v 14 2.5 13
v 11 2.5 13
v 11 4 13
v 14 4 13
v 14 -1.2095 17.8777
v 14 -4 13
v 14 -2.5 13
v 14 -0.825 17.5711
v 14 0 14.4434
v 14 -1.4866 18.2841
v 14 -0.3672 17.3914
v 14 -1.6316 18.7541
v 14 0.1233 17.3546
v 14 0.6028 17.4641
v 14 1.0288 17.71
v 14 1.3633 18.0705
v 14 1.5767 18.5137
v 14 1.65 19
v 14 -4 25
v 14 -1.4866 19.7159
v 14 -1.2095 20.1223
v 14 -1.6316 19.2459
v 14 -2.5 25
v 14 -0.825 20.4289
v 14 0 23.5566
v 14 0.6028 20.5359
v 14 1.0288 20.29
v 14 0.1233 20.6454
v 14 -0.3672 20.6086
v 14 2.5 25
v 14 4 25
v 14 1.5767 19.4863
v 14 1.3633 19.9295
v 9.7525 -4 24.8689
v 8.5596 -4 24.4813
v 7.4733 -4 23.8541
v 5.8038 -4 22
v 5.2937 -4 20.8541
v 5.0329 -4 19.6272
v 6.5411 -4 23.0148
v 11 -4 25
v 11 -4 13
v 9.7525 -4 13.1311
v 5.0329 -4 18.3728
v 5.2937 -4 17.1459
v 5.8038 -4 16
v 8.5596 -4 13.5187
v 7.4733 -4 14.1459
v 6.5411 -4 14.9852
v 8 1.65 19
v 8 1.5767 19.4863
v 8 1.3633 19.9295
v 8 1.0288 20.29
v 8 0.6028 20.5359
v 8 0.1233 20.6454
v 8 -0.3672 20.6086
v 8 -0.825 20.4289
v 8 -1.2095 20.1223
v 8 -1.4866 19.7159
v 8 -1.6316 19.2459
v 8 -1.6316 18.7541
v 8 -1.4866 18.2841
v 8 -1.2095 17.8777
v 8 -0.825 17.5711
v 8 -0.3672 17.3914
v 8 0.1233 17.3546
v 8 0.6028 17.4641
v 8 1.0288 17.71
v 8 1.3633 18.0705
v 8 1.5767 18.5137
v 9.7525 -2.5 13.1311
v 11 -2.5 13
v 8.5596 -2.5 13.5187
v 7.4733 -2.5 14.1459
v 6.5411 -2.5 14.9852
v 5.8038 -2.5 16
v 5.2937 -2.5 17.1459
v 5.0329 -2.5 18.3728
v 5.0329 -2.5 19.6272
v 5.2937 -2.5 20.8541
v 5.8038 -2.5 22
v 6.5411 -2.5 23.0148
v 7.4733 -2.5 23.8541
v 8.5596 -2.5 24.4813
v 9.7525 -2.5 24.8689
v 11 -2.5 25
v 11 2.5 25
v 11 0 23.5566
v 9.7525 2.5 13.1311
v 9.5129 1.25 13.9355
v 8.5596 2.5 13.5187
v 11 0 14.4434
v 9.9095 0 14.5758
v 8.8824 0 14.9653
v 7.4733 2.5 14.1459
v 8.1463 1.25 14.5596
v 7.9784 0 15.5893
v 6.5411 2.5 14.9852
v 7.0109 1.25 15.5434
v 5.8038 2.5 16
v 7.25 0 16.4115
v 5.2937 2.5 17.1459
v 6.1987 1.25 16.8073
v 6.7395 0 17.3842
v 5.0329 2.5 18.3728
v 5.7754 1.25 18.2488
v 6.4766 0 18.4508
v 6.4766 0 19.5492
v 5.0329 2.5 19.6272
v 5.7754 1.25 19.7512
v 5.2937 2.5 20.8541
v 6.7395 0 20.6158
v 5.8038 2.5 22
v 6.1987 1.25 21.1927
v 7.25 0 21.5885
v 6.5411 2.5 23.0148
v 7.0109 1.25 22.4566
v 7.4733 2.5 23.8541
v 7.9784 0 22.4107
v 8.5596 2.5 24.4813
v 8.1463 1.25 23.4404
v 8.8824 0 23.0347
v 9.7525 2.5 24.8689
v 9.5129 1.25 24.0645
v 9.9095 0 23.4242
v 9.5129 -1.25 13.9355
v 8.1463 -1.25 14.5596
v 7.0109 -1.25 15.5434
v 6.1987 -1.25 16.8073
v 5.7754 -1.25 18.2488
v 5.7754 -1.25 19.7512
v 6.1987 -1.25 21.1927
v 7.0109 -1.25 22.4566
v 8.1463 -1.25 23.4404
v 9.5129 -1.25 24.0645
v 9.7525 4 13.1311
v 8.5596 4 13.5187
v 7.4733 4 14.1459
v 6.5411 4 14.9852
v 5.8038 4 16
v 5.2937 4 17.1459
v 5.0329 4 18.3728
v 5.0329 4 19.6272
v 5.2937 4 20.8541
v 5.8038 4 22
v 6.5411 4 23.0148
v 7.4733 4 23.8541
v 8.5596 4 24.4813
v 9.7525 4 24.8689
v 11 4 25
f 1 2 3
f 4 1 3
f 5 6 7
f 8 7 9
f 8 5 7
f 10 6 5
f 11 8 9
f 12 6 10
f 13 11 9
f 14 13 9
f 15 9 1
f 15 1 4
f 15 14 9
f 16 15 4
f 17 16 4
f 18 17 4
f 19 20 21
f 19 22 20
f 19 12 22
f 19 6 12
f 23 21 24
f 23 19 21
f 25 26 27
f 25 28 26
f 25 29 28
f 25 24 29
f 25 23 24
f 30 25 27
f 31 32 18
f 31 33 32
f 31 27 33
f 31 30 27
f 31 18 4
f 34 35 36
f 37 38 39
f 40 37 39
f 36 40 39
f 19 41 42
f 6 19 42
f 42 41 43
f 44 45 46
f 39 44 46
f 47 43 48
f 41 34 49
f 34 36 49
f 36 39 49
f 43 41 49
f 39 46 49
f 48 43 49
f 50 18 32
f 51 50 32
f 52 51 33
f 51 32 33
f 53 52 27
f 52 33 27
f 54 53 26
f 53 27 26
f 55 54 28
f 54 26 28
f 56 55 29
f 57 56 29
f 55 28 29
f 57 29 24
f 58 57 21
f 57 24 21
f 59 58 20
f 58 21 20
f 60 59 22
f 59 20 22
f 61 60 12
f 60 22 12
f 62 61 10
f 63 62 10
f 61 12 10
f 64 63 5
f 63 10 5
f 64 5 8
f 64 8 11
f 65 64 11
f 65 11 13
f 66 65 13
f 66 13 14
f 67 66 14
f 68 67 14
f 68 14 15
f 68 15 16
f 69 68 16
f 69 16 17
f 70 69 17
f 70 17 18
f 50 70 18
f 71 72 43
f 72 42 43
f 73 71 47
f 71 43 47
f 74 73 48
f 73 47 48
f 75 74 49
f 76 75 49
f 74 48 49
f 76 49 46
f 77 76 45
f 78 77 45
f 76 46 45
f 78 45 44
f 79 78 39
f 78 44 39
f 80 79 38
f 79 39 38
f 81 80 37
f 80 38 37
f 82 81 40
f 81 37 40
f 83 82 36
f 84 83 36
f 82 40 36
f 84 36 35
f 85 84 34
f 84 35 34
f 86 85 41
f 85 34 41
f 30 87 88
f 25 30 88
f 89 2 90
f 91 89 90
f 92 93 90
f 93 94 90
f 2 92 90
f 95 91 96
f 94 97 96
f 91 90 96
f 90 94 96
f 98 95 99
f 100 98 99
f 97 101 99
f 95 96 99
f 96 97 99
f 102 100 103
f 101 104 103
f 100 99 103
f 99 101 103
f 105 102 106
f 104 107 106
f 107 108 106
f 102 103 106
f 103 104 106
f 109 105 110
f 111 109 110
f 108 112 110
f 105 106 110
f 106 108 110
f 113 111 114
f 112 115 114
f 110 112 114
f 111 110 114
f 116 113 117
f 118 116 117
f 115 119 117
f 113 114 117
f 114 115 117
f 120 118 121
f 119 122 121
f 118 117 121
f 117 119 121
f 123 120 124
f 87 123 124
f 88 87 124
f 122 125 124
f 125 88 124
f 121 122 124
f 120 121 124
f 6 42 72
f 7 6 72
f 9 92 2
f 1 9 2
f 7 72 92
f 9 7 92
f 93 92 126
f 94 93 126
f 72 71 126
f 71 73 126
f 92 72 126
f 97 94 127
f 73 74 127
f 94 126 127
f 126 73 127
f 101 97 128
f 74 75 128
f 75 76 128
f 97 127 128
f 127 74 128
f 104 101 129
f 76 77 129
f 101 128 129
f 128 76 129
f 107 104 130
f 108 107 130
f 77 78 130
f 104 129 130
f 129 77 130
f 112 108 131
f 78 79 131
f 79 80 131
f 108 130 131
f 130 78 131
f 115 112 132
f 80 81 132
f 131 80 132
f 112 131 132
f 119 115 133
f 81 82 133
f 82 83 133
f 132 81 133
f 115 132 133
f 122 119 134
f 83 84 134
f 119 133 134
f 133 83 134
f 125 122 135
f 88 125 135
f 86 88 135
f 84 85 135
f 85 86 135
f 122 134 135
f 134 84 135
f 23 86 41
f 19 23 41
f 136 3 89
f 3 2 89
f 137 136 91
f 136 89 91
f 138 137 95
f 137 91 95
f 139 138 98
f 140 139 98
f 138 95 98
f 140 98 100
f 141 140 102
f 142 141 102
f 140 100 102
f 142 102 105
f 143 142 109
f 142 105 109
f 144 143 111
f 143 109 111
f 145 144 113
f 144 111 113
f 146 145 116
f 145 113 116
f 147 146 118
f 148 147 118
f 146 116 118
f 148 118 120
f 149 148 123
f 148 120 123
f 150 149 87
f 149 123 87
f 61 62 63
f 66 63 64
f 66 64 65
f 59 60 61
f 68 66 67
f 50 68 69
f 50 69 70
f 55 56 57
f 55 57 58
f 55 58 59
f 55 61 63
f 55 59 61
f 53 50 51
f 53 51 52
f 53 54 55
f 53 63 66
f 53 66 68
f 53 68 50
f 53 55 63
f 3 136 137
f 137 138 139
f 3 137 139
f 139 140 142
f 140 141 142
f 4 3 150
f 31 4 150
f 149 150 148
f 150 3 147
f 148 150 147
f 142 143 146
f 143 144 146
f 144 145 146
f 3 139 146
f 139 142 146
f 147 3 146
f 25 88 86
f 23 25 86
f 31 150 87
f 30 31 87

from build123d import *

# Parameters (mm, degrees)
REVOLUTION002_ANGLE     = 180
SKETCH015_R             = 1.65
POCKET007_DEPTH         = 7
PAD006_DEPTH            = 3
SKETCH022_R             = 1.65
POCKET012_DEPTH         = 6
BODY004_PLACEMENT_ANGLE = 180


with BuildPart() as part:
    # Sketch014 → Revolution002 (revolve)
    with BuildSketch(Plane.YZ):
        Polygon((-4, 0), (4, 0), (4, 6), (2.5, 6), (0, 4.556624), (-2.5, 6), (-4, 6), align=None)
    revolve(axis=Axis((0, 0, 0), (0, 1, 0)), revolution_arc=REVOLUTION002_ANGLE)

    # Sketch015 → Pocket007 (cut)
    with BuildSketch(Plane(origin=(-5, 0, 0), x_dir=(0, 1, 0), z_dir=(-1, 0, 0))):
        Circle(SKETCH015_R)
    extrude(amount=-POCKET007_DEPTH, mode=Mode.SUBTRACT)

    # Revolution002 Face7 → Pad006 (add)
    with BuildSketch(Plane(origin=(0, 0, 0), x_dir=(0, 1, 0), z_dir=(-1, 0, 0))):
        Polygon((4, -6), (4, 6), (2.5, 6), (0, 4.556624), (-2.5, 6), (-4, 6), (-4, -6), (-2.5, -6), (0, -4.556624), (2.5, -6), align=None)
    extrude(amount=PAD006_DEPTH)

    # Sketch022 (on Face5 of Pad006) → Pocket012 (cut)
    with BuildSketch(Plane(origin=(-3, 0, 0), x_dir=(0, 1, 0), z_dir=(-1, 0, 0))):
        Circle(SKETCH022_R)
    extrude(amount=-POCKET012_DEPTH, mode=Mode.SUBTRACT)


with BuildPart() as part_1:
    # Body004 placement: moved
    add(part.part.moved(Location((11, 0, 19))).rotate(Axis((11, 0, 19), (0, 1, 0)), BODY004_PLACEMENT_ANGLE))


solid = part_1.part
